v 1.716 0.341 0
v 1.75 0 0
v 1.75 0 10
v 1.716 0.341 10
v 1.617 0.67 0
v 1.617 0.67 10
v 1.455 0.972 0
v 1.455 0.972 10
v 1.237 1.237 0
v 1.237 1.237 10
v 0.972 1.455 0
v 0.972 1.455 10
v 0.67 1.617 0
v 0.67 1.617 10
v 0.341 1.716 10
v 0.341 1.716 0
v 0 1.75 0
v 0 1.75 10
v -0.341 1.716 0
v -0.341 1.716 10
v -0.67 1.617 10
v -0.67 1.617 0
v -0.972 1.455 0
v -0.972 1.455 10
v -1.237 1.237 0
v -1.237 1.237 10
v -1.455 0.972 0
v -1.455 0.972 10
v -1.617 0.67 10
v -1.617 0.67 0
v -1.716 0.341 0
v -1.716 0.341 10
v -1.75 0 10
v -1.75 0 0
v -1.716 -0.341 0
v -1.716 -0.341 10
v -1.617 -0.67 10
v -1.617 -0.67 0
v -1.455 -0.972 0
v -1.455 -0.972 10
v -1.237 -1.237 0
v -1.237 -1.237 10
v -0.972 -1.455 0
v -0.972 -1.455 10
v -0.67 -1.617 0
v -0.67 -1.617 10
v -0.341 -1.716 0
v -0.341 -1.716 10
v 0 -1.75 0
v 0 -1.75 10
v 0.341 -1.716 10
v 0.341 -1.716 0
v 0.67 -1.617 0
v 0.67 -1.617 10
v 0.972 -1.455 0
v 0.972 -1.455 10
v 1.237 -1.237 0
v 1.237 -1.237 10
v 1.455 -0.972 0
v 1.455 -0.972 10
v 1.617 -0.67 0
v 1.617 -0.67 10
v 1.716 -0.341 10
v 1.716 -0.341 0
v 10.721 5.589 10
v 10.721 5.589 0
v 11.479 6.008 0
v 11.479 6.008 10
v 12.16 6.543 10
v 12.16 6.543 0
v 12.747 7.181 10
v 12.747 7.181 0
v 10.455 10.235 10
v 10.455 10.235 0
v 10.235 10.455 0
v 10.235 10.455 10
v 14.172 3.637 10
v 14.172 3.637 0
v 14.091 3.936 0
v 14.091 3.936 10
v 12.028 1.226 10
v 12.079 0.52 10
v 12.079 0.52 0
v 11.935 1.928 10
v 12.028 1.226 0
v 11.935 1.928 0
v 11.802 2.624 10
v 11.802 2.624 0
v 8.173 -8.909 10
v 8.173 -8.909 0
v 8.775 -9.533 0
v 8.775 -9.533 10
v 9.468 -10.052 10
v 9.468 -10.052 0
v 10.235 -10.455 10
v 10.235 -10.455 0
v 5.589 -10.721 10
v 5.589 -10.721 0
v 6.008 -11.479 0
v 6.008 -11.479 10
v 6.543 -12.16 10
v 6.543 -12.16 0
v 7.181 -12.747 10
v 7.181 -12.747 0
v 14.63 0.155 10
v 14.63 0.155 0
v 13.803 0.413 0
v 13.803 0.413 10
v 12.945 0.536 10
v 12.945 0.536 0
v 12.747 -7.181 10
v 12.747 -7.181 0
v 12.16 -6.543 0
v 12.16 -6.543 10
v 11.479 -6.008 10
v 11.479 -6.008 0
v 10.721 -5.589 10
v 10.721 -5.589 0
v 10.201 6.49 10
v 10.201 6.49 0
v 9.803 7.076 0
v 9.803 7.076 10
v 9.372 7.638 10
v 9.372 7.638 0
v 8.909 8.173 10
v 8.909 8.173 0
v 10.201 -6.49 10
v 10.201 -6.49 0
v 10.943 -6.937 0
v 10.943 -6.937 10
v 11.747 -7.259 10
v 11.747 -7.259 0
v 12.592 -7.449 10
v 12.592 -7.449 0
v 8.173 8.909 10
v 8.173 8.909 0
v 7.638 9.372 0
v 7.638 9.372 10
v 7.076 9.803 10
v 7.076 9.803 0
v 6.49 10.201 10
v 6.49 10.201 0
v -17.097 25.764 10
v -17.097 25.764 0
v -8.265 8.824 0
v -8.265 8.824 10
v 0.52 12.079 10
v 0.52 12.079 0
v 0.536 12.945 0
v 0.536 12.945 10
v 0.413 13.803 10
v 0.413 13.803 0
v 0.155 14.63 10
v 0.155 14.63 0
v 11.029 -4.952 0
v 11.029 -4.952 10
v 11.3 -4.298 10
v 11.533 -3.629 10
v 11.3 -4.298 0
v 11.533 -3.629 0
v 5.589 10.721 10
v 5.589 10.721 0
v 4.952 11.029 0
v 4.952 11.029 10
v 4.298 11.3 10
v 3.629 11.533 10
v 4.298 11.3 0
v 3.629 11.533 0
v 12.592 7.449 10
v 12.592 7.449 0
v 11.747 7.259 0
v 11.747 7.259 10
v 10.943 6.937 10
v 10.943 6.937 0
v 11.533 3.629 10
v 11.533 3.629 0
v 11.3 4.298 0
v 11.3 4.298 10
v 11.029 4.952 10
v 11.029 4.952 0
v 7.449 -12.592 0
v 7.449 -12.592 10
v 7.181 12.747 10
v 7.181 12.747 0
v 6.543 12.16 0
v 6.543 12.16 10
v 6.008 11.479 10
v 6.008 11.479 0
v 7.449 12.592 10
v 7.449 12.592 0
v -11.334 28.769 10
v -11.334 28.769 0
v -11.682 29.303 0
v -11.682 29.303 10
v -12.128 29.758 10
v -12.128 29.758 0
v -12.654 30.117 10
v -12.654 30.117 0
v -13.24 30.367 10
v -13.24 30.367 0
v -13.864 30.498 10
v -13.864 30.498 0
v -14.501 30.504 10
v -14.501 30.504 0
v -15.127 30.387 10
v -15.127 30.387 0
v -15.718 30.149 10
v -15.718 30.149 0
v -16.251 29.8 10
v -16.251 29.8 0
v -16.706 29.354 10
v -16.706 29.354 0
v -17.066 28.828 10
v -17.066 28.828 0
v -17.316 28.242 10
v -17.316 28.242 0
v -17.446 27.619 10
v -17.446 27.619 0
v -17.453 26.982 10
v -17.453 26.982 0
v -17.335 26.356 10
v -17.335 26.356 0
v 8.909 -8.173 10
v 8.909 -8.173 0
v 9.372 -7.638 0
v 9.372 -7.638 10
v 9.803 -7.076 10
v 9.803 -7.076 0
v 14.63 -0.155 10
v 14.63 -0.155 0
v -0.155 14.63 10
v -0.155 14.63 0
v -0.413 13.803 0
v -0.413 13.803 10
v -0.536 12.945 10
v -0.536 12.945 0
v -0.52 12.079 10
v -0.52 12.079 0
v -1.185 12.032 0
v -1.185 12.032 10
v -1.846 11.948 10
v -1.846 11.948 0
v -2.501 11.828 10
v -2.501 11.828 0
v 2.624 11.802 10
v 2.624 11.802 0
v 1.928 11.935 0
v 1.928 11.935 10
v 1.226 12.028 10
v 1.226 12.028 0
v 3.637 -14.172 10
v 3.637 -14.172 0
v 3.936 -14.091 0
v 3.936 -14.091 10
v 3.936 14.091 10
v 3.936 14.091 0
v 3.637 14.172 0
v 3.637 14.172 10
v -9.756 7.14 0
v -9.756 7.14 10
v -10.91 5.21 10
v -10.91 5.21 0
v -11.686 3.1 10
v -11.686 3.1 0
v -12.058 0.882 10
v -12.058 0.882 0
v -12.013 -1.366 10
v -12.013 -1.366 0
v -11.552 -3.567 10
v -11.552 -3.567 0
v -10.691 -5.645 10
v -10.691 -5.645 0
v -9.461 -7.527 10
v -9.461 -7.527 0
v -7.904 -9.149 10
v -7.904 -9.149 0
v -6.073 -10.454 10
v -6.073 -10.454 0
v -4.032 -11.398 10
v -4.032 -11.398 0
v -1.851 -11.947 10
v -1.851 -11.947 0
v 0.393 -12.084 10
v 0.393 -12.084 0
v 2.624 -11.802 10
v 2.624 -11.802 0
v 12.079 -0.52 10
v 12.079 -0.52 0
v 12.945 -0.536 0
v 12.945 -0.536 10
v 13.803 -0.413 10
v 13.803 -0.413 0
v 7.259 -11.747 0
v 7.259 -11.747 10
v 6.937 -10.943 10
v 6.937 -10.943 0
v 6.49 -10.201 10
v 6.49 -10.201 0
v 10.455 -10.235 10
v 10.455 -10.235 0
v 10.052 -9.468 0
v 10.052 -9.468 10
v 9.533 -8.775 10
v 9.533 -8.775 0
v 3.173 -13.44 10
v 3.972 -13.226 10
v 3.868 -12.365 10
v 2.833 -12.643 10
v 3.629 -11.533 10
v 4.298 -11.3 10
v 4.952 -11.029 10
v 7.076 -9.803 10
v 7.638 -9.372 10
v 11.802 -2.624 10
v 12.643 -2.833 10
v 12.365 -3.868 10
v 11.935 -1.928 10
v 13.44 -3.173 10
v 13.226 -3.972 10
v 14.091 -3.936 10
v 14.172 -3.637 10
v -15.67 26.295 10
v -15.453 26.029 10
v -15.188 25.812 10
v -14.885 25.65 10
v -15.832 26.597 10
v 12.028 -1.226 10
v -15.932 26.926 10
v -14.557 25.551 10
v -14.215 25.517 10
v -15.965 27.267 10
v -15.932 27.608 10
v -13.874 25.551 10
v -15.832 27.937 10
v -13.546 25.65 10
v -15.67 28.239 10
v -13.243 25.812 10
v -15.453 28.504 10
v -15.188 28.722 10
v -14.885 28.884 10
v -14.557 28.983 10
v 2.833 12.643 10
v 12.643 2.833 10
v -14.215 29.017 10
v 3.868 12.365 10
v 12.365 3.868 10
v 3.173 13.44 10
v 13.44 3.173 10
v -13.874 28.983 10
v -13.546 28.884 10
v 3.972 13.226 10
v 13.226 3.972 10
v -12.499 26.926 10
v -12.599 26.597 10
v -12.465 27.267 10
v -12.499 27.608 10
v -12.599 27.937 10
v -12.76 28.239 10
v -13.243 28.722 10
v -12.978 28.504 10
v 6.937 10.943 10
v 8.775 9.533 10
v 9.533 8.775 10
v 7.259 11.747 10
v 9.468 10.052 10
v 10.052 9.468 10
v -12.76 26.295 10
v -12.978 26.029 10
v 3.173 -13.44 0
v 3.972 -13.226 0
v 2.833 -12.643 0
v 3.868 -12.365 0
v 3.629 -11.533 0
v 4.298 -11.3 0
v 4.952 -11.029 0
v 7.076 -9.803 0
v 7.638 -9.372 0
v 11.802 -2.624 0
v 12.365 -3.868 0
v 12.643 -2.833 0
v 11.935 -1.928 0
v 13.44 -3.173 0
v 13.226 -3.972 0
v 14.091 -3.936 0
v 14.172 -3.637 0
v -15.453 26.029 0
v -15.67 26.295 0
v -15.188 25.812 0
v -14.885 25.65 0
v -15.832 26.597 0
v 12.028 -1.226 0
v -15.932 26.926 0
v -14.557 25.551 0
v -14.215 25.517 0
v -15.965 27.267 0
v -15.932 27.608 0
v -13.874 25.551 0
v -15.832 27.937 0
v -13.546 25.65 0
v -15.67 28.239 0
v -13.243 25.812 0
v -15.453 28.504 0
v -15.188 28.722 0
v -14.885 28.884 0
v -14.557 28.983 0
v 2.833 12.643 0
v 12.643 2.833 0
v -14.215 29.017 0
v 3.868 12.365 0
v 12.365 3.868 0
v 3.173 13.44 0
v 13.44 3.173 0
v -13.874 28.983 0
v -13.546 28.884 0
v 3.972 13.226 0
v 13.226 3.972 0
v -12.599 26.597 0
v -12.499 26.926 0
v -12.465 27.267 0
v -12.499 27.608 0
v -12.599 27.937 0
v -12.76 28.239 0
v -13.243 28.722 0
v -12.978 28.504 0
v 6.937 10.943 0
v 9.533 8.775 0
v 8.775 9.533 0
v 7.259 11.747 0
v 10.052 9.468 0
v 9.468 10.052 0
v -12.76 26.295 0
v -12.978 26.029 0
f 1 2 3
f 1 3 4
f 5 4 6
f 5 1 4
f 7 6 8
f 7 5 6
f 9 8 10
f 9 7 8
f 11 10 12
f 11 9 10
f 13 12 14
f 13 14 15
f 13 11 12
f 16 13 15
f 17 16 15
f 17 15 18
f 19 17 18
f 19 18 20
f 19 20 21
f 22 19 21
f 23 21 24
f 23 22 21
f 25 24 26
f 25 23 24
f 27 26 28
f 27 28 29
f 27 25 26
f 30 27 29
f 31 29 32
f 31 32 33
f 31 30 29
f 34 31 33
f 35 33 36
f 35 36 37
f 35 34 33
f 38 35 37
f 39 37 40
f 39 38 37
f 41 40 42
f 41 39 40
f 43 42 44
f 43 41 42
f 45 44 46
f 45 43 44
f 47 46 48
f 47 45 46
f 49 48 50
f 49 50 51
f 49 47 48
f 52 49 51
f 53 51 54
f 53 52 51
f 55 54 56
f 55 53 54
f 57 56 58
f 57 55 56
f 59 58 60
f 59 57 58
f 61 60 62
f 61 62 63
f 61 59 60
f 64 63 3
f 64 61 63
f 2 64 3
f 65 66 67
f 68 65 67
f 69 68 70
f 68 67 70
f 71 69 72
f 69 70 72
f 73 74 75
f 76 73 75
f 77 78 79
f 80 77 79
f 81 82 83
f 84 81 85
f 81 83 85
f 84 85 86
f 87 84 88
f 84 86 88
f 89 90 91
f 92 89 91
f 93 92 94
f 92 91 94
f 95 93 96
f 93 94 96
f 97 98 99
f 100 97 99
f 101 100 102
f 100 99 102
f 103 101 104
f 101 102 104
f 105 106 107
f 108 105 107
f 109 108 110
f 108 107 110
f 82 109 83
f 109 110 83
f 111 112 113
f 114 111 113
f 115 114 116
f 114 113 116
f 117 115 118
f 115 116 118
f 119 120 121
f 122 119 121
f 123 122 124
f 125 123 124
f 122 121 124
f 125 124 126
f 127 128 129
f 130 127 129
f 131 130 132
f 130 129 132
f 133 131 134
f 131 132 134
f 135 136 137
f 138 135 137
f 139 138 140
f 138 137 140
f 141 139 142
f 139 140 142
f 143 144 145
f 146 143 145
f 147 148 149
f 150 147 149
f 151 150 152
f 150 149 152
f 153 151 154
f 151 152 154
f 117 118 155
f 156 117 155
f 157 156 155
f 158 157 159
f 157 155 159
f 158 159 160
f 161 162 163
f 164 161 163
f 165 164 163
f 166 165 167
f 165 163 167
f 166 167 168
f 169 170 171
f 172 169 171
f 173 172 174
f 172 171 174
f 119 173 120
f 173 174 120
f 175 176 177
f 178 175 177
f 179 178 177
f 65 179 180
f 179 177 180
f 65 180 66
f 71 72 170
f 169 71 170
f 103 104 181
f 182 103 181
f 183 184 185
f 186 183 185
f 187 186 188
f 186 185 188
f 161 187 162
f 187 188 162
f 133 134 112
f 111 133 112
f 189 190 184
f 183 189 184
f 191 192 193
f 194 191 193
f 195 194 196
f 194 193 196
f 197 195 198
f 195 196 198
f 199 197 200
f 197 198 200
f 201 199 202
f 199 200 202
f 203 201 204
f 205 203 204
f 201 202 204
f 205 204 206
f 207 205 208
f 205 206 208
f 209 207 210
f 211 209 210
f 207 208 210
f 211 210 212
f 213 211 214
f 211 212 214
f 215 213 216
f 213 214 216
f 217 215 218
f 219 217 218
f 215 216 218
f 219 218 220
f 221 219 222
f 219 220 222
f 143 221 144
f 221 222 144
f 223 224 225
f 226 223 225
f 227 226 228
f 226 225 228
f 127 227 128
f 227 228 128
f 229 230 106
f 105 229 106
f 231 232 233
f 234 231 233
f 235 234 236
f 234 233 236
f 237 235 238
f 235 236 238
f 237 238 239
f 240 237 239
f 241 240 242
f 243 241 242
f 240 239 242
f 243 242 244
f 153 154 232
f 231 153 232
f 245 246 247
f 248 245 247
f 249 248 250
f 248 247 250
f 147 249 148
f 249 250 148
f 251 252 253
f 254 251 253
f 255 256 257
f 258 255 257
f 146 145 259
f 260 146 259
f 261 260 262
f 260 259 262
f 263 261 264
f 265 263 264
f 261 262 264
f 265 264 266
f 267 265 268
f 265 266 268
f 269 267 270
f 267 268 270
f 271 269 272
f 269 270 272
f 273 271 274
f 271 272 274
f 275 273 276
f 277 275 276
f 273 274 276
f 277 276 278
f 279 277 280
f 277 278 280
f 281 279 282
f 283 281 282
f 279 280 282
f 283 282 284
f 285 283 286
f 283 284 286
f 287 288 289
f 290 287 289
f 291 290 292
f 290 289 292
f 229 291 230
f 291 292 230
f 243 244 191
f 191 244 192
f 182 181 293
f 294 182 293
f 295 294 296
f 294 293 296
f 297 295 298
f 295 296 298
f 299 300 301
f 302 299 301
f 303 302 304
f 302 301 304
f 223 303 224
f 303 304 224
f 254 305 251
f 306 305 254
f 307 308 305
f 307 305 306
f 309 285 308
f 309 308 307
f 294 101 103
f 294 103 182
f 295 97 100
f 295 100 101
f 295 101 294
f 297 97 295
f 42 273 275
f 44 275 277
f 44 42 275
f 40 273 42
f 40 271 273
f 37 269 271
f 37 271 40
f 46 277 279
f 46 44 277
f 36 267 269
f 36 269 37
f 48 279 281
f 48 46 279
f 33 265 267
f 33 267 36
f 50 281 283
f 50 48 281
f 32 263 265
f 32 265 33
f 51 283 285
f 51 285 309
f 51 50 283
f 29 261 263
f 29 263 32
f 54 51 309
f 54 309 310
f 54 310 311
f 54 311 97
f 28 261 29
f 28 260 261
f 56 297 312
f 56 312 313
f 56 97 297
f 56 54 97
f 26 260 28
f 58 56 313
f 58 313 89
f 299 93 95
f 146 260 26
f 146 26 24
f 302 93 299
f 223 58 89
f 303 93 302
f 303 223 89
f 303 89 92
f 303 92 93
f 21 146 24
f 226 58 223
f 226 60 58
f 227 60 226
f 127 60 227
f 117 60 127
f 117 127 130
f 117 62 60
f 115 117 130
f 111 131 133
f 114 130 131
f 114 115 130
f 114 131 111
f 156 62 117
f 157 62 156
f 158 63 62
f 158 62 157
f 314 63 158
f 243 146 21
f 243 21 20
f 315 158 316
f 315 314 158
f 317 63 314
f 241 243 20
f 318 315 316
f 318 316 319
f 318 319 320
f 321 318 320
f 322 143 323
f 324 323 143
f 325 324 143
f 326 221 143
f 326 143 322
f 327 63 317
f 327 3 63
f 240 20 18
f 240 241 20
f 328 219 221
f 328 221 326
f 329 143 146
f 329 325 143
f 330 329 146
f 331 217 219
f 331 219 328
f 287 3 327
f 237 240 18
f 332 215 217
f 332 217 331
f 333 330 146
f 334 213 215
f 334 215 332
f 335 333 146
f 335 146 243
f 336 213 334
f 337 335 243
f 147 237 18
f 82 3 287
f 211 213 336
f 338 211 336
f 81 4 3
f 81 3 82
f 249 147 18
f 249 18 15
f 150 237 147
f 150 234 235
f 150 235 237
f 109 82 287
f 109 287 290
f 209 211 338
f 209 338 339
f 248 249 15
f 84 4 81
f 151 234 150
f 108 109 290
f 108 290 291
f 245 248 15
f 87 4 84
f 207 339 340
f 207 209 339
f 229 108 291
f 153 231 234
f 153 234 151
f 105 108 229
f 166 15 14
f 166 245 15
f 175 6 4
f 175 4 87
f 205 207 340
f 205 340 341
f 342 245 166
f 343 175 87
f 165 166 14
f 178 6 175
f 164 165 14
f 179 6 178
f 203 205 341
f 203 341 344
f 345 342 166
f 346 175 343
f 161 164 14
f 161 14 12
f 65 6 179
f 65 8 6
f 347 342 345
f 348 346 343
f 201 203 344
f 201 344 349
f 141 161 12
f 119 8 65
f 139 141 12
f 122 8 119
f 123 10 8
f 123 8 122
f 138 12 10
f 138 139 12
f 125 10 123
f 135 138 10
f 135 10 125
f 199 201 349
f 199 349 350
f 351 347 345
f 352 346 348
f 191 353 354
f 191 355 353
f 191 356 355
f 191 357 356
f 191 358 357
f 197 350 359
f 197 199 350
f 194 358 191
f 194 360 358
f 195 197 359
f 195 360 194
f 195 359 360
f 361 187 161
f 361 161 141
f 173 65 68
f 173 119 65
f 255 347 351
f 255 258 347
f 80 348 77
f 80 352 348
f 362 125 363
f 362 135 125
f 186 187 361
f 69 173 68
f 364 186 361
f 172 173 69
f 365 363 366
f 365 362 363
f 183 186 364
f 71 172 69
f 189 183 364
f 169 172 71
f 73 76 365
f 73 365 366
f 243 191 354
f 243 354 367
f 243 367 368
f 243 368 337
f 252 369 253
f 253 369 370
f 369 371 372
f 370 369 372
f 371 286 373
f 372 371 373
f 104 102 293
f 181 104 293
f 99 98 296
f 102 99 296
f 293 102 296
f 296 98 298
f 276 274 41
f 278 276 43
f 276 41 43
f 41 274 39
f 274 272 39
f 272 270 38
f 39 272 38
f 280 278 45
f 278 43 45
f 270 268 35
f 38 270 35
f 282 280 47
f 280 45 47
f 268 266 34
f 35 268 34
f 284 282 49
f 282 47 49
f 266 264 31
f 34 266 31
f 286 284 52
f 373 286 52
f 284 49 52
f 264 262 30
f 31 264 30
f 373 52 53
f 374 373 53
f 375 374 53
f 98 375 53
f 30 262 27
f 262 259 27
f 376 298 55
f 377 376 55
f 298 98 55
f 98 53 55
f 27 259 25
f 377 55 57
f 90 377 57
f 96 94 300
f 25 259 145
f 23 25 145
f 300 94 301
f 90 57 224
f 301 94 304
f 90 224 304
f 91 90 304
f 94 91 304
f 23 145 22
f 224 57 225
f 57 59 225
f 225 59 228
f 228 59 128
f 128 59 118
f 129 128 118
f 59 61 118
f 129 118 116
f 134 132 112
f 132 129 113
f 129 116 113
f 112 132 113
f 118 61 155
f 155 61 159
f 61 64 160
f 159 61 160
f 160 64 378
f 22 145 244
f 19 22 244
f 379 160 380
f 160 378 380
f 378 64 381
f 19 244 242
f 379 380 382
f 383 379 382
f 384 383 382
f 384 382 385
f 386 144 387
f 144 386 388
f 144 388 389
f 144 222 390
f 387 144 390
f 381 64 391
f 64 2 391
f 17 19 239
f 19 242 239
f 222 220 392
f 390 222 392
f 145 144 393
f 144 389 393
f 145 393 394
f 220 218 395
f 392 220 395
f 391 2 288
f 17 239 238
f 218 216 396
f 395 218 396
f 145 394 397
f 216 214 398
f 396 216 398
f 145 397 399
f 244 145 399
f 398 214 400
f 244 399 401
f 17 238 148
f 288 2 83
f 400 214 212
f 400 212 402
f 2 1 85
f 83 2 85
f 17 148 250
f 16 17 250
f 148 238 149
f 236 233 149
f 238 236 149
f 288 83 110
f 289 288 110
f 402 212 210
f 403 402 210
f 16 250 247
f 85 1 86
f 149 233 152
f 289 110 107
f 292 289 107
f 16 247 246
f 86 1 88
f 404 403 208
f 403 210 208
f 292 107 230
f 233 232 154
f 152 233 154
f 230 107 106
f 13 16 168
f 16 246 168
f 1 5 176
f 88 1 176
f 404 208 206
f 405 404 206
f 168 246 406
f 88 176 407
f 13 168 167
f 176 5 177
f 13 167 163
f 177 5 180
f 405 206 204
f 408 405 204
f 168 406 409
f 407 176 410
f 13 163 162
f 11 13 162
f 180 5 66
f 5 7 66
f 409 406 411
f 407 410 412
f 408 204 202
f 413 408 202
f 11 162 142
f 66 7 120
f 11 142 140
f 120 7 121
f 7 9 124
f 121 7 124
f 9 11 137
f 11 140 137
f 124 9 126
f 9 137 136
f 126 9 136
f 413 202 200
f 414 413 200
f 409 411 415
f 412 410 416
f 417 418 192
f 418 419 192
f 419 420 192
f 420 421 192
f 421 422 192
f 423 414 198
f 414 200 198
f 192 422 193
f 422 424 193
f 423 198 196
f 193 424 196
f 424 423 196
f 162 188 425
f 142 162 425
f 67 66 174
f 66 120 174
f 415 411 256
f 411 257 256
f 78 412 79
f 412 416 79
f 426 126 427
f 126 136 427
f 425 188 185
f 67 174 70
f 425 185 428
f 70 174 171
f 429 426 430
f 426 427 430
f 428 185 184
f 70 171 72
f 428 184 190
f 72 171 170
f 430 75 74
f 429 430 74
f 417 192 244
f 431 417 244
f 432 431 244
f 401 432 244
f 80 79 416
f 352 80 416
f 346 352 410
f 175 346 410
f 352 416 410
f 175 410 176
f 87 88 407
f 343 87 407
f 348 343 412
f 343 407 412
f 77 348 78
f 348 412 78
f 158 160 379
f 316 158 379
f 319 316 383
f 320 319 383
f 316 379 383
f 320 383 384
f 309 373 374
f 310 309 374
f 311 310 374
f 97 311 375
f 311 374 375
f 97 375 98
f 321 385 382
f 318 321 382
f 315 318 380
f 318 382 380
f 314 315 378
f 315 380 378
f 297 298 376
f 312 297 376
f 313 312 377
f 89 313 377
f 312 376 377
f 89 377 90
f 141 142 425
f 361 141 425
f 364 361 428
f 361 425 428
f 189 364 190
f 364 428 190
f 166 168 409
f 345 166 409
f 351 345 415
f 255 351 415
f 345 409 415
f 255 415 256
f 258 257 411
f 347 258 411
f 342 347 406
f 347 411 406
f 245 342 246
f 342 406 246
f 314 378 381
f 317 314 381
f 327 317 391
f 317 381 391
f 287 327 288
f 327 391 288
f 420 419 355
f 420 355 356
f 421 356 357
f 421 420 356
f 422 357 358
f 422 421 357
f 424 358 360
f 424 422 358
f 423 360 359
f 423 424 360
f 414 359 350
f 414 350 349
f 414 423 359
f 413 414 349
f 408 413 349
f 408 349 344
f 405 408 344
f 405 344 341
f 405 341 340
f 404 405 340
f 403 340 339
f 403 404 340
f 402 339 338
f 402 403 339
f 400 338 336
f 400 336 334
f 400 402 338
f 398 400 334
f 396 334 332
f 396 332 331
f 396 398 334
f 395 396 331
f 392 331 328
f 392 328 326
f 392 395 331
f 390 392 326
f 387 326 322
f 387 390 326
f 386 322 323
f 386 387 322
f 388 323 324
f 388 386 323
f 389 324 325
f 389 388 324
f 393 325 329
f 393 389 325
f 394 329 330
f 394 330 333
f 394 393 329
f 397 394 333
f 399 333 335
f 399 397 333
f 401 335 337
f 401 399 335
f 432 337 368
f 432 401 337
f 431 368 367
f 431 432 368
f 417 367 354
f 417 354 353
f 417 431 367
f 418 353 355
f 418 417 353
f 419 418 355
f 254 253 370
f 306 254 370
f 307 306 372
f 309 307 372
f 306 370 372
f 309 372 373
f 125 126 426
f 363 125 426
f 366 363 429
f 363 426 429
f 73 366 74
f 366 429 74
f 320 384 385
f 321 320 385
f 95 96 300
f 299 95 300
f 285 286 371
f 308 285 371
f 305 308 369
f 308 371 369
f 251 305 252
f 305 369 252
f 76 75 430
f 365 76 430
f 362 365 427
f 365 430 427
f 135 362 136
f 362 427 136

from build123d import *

# Parameters (mm, degrees)
SKETCH1_R           = 1.75
BOSS_EXTRUDE1_DEPTH = 10


with BuildPart() as part:
    # Sketch1 → Boss-Extrude1 (new body)
    with BuildSketch(Plane.XY):
        with BuildLine():
            Line((0.155, 14.63), (-0.155, 14.63))
            ThreePointArc((-0.155, 14.63), (-0.491925829, 13.37649981), (-0.52, 12.078812028))
            ThreePointArc((-0.52, 12.078812028), (-1.515917744, 11.994586003), (-2.50147536, 11.828386239))
            Line((-2.50147536, 11.828386239), (-11.333513235, 28.769367003))
            ThreePointArc((-11.333513235, 28.769367003), (-15.717822608, 30.148798524), (-17.097254129, 25.764489151))
            Line((-17.097254129, 25.764489151), (-8.265216255, 8.823508388))
            ThreePointArc((-8.265216255, 8.823508388), (-10.691447625, -5.644559122), (2.623945165, -11.801822392))
            ThreePointArc((2.623945165, -11.801822392), (2.986929045, -13.048026405), (3.636804127, -14.171611791))
            Line((3.636804127, -14.171611791), (3.936241133, -14.091377887))
            ThreePointArc((3.936241133, -14.091377887), (3.937256771, -12.793386859), (3.628508025, -11.532650585))
            ThreePointArc((3.628508025, -11.532650585), (4.626642697, -11.169703548), (5.589072804, -10.720558064))
            ThreePointArc((5.589072804, -10.720558064), (6.26222964, -11.830351564), (7.180766062, -12.747451657))
            Line((7.180766062, -12.747451657), (7.449233938, -12.592451657))
            ThreePointArc((7.449233938, -12.592451657), (7.11427017, -11.338425735), (6.489739224, -10.200558064))
            ThreePointArc((6.489739224, -10.200558064), (7.359925677, -9.591641884), (8.173314367, -8.90870542))
            ThreePointArc((8.173314367, -8.90870542), (9.110769635, -9.806457814), (10.235370658, -10.45457376))
            Line((10.235370658, -10.45457376), (10.45457376, -10.235370658))
            ThreePointArc((10.45457376, -10.235370658), (9.806457814, -9.110769635), (8.90870542, -8.173314367))
            ThreePointArc((8.90870542, -8.173314367), (9.591641884, -7.359925677), (10.200558064, -6.489739224))
            ThreePointArc((10.200558064, -6.489739224), (11.338425735, -7.11427017), (12.592451657, -7.449233938))
            Line((12.592451657, -7.449233938), (12.747451657, -7.180766062))
            ThreePointArc((12.747451657, -7.180766062), (11.830351564, -6.26222964), (10.720558064, -5.589072804))
            ThreePointArc((10.720558064, -5.589072804), (11.169703548, -4.626642697), (11.532650585, -3.628508025))
            ThreePointArc((11.532650585, -3.628508025), (12.793386859, -3.937256771), (14.091377887, -3.936241133))
            Line((14.091377887, -3.936241133), (14.171611791, -3.636804127))
            ThreePointArc((14.171611791, -3.636804127), (13.048026405, -2.986929045), (11.801822392, -2.623945165))
            ThreePointArc((11.801822392, -2.623945165), (11.986568374, -1.578061664), (12.078812028, -0.52))
            ThreePointArc((12.078812028, -0.52), (13.37649981, -0.491925829), (14.63, -0.155))
            Line((14.63, -0.155), (14.63, 0.155))
            ThreePointArc((14.63, 0.155), (13.37649981, 0.491925829), (12.078812028, 0.52))
            ThreePointArc((12.078812028, 0.52), (11.986568374, 1.578061664), (11.801822392, 2.623945165))
            ThreePointArc((11.801822392, 2.623945165), (13.048026405, 2.986929045), (14.171611791, 3.636804127))
            Line((14.171611791, 3.636804127), (14.091377887, 3.936241133))
            ThreePointArc((14.091377887, 3.936241133), (12.793386859, 3.937256771), (11.532650585, 3.628508025))
            ThreePointArc((11.532650585, 3.628508025), (11.169703548, 4.626642697), (10.720558064, 5.589072804))
            ThreePointArc((10.720558064, 5.589072804), (11.830351564, 6.26222964), (12.747451657, 7.180766062))
            Line((12.747451657, 7.180766062), (12.592451657, 7.449233938))
            ThreePointArc((12.592451657, 7.449233938), (11.338425735, 7.11427017), (10.200558064, 6.489739224))
            ThreePointArc((10.200558064, 6.489739224), (9.591641884, 7.359925677), (8.90870542, 8.173314367))
            ThreePointArc((8.90870542, 8.173314367), (9.806457814, 9.110769635), (10.45457376, 10.235370658))
            Line((10.45457376, 10.235370658), (10.235370658, 10.45457376))
            ThreePointArc((10.235370658, 10.45457376), (9.110769635, 9.806457814), (8.173314367, 8.90870542))
            ThreePointArc((8.173314367, 8.90870542), (7.359925677, 9.591641884), (6.489739224, 10.200558064))
            ThreePointArc((6.489739224, 10.200558064), (7.11427017, 11.338425735), (7.449233938, 12.592451657))
            Line((7.449233938, 12.592451657), (7.180766062, 12.747451657))
            ThreePointArc((7.180766062, 12.747451657), (6.26222964, 11.830351564), (5.589072804, 10.720558064))
            ThreePointArc((5.589072804, 10.720558064), (4.626642697, 11.169703548), (3.628508025, 11.532650585))
            ThreePointArc((3.628508025, 11.532650585), (3.937256771, 12.793386859), (3.936241133, 14.091377887))
            Line((3.936241133, 14.091377887), (3.636804127, 14.171611791))
            ThreePointArc((3.636804127, 14.171611791), (2.986929045, 13.048026405), (2.623945165, 11.801822392))
            ThreePointArc((2.623945165, 11.801822392), (1.578061664, 11.986568374), (0.52, 12.078812028))
            ThreePointArc((0.52, 12.078812028), (0.491925829, 13.37649981), (0.155, 14.63))
        make_face()
        Circle(SKETCH1_R, mode=Mode.SUBTRACT)
        with Locations((-14.215383682, 27.266928077)):
            Circle(SKETCH1_R, mode=Mode.SUBTRACT)
    extrude(amount=BOSS_EXTRUDE1_DEPTH)


solid = part.part
